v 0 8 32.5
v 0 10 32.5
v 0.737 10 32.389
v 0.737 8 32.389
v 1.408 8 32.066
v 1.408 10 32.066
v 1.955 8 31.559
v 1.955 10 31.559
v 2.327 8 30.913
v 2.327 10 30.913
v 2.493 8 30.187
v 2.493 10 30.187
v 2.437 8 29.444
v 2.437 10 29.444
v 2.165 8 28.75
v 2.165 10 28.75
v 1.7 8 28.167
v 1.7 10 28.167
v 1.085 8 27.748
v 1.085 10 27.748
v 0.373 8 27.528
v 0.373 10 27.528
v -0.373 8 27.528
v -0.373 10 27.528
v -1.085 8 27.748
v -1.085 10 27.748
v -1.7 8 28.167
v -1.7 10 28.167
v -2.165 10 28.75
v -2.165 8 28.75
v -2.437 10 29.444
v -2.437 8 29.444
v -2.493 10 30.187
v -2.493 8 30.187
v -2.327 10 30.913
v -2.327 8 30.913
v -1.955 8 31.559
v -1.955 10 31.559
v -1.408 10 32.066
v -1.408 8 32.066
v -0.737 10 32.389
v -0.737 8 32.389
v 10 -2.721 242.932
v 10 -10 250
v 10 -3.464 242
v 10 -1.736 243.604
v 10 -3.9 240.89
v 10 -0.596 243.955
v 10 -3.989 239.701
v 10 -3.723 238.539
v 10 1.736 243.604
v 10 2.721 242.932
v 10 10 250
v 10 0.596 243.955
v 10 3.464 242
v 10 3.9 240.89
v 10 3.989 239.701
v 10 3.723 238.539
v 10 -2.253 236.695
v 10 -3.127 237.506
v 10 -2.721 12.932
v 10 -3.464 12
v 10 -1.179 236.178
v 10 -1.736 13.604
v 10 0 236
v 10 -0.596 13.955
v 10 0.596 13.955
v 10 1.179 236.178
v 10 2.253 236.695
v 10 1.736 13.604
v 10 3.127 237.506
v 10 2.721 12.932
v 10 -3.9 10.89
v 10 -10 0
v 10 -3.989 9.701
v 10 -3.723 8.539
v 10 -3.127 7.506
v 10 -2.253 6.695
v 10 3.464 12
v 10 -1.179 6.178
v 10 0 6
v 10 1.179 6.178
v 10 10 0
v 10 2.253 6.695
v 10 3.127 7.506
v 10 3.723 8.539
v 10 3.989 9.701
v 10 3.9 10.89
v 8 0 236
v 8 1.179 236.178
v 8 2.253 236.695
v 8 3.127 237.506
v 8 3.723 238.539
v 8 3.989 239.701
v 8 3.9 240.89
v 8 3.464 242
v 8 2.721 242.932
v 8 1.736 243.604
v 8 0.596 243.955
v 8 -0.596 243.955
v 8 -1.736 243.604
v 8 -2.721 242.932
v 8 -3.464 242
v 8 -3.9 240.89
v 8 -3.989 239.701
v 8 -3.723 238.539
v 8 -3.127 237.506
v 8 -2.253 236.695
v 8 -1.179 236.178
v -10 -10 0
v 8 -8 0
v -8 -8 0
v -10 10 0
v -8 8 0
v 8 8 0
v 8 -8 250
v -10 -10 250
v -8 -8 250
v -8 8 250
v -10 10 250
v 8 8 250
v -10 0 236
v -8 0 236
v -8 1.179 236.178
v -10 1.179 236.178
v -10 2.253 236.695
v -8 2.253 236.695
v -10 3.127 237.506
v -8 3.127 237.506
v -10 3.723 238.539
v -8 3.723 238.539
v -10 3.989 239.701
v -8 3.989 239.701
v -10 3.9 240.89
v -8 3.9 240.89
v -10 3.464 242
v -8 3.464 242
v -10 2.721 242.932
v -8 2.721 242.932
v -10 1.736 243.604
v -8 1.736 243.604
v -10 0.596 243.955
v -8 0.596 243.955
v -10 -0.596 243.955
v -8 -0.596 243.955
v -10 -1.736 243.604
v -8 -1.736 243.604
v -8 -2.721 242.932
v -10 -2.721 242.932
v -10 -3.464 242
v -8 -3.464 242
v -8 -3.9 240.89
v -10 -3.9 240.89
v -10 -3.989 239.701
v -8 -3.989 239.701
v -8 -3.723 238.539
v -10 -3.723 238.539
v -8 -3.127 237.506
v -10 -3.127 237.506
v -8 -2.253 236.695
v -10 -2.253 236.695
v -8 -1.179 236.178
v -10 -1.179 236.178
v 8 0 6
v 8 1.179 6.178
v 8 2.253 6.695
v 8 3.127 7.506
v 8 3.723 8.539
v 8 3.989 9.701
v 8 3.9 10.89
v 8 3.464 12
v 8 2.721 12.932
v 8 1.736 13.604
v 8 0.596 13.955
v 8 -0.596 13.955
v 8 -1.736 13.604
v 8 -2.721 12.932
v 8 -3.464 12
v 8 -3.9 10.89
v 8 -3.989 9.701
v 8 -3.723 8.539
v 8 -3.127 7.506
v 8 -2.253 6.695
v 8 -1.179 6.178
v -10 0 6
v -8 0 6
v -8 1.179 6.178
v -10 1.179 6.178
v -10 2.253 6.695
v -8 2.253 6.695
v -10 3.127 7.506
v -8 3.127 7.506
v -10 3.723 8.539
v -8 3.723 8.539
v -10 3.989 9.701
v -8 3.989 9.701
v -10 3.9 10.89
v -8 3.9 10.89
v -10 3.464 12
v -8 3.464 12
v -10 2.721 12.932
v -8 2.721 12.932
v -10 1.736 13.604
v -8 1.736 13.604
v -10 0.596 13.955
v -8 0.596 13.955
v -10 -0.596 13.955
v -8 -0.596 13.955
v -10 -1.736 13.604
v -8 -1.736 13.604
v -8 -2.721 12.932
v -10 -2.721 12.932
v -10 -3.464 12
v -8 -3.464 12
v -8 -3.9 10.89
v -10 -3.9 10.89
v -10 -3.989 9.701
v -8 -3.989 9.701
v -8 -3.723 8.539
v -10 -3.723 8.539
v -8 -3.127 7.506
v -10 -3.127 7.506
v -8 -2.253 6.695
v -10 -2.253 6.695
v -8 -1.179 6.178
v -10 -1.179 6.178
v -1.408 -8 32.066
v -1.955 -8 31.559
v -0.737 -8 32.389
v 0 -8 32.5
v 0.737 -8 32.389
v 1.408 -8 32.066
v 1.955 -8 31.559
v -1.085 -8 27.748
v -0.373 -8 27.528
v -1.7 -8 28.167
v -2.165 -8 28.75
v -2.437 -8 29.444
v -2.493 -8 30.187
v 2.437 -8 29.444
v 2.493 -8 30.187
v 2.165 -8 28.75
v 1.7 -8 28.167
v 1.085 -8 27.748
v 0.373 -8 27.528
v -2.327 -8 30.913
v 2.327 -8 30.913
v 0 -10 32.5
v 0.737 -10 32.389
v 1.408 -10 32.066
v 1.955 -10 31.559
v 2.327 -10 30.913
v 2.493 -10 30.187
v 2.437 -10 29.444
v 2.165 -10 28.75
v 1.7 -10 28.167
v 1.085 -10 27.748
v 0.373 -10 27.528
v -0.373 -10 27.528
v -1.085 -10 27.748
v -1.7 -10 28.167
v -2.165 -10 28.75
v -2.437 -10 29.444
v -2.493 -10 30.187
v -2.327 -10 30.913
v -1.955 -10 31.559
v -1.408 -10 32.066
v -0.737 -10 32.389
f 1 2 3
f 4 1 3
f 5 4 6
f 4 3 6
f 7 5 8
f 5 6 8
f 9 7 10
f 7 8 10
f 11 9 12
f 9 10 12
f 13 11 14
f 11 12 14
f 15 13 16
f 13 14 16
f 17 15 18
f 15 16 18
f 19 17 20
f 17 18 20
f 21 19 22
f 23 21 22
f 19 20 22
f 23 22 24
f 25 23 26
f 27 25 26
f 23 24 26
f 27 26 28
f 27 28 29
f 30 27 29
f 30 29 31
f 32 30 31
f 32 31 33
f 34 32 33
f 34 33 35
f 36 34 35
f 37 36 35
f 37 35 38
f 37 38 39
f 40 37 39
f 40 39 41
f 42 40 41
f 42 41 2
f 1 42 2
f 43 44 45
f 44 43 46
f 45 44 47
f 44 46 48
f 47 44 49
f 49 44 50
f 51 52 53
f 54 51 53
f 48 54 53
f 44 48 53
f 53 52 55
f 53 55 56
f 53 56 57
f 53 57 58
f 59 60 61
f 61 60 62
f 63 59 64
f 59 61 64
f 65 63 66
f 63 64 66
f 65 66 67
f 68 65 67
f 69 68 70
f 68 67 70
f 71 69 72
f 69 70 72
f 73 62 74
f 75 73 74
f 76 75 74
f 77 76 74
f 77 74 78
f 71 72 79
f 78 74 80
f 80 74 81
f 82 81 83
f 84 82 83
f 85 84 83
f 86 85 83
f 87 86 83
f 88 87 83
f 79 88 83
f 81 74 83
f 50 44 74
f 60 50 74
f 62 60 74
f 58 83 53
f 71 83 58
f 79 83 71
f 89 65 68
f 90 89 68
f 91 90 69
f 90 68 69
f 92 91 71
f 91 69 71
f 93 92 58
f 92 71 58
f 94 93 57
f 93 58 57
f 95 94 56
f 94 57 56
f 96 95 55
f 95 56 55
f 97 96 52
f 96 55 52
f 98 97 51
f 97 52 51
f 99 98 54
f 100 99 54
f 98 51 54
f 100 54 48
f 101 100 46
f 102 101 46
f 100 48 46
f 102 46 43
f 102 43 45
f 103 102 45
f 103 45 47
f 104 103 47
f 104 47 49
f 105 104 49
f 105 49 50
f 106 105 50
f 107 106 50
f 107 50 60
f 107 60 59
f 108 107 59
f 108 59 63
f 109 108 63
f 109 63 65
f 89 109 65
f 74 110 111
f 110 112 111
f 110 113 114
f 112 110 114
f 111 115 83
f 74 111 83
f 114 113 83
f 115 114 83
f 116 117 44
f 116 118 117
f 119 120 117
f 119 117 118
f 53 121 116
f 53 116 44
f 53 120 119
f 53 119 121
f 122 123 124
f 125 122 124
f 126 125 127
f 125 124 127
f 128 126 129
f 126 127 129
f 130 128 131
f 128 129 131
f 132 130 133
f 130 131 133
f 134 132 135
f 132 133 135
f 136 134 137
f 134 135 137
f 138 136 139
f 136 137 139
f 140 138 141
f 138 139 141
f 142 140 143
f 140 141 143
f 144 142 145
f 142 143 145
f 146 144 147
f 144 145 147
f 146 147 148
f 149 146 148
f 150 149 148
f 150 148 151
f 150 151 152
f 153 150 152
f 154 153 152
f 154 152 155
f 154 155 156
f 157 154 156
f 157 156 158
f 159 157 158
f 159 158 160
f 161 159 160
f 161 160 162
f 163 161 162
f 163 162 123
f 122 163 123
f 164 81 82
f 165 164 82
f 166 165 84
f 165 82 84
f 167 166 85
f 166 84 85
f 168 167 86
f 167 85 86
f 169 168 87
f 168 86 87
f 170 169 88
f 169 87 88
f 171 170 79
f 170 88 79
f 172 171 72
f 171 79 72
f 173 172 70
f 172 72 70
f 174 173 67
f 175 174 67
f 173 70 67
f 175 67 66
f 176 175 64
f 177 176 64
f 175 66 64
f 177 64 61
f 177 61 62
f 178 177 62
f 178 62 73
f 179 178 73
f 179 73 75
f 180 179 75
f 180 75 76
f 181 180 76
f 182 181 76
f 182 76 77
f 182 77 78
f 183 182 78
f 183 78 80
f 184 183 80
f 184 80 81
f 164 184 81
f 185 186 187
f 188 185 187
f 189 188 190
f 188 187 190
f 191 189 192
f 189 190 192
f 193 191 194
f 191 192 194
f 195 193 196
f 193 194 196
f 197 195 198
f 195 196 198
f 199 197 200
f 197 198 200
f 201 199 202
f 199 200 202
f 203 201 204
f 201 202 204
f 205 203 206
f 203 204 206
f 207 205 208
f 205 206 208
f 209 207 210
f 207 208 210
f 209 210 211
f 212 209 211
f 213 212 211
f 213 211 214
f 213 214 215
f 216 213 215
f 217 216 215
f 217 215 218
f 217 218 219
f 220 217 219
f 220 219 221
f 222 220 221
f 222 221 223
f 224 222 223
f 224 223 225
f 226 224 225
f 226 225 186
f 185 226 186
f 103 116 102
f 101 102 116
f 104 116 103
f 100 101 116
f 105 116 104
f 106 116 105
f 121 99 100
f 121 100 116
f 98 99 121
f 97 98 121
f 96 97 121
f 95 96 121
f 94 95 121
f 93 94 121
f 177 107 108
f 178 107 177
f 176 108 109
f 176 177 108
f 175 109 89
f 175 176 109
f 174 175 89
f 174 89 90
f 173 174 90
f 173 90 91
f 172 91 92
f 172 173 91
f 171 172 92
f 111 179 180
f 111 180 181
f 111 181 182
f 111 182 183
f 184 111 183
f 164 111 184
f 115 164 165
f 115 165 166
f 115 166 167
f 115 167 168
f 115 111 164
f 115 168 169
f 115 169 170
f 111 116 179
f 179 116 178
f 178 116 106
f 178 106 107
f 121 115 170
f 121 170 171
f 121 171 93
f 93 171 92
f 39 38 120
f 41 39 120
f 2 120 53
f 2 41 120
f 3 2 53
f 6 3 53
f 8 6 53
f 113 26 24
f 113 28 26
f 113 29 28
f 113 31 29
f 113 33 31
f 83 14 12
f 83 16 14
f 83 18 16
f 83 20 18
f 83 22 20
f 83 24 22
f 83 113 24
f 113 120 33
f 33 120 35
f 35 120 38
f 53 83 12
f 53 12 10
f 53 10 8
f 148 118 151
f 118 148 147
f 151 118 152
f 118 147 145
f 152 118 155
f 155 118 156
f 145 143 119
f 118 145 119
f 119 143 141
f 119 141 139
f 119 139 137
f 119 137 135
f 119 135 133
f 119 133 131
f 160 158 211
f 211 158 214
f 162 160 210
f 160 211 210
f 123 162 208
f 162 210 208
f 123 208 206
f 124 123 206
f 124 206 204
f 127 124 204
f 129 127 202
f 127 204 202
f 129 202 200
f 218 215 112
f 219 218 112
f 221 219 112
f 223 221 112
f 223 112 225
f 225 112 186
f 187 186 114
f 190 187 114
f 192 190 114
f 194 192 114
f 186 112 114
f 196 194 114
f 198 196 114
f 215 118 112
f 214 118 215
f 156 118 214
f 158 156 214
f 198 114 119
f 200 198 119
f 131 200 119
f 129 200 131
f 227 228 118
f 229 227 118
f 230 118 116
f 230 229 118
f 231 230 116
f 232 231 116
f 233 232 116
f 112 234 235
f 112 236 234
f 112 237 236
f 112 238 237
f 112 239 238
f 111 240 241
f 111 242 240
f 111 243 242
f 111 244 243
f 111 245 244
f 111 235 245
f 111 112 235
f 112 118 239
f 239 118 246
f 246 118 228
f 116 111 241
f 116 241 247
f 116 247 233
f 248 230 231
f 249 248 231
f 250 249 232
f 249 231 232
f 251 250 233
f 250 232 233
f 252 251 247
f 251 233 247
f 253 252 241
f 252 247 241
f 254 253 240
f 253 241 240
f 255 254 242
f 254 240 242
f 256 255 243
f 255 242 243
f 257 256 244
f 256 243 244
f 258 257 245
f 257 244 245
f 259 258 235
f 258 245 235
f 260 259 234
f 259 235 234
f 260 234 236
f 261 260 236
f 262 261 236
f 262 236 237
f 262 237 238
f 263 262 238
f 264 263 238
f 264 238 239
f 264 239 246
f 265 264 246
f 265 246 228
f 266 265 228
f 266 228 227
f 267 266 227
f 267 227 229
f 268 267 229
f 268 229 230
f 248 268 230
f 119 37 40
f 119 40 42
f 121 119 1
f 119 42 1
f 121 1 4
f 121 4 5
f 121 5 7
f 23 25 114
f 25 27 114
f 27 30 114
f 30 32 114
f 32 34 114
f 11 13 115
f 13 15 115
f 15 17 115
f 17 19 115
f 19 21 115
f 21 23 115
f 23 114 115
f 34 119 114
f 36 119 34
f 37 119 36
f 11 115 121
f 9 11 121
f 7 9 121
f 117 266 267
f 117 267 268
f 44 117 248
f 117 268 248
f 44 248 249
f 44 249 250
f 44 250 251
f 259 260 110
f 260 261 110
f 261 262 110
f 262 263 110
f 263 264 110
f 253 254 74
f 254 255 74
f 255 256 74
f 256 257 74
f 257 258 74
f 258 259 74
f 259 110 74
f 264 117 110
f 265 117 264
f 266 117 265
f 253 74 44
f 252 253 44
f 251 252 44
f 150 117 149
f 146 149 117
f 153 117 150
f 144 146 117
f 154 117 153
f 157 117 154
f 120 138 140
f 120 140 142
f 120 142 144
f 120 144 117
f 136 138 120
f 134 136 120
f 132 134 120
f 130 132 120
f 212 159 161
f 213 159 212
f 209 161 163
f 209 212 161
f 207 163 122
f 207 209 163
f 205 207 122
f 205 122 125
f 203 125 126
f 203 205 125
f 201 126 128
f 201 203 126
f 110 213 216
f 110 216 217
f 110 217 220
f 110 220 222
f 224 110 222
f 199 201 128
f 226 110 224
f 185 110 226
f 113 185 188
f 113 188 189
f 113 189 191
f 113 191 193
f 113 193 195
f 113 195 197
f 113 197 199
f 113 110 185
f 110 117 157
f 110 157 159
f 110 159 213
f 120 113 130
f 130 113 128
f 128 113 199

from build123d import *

# Parameters (mm, degrees)
SZKIC1_W                    = 20
SZKIC1_H                    = 20
SZKIC1_W_2                  = 16
SZKIC1_H_2                  = 16
DODANIE_WYCI_GNI_CIE1_DEPTH = 250
SZKIC2_R                    = 4
WYTNIJ_WYCI_GNI_CIE1_DEPTH  = 251.99800796
SZKIC3_R                    = 2.5
WYTNIJ_WYCI_GNI_CIE2_DEPTH  = 251.99800796


with BuildPart() as part:
    # Szkic1 → Dodanie-wyciągnięcie1 (new body)
    with BuildSketch(Plane.XY):
        Rectangle(SZKIC1_W, SZKIC1_H)
        Rectangle(SZKIC1_W_2, SZKIC1_H_2, mode=Mode.SUBTRACT)
    extrude(amount=DODANIE_WYCI_GNI_CIE1_DEPTH)

    # Szkic2 → Wytnij-wyciągnięcie1 (cut, through all)
    with BuildSketch(Plane(origin=(10, 0, 0), x_dir=(0, 0, -1), z_dir=(1, 0, 0))):
        with Locations((-10, 0)):
            Circle(SZKIC2_R)
        with Locations((-240, 0)):
            Circle(SZKIC2_R)
    extrude(amount=-WYTNIJ_WYCI_GNI_CIE1_DEPTH, mode=Mode.SUBTRACT)

    # Szkic3 → Wytnij-wyciągnięcie2 (cut, through all)
    with BuildSketch(Plane(origin=(0, 10, 0), x_dir=(1, 0, 0), z_dir=(0, 1, 0))):
        with Locations(Location((0, -30, 0), (0, 0, 270))):
            Circle(SZKIC3_R)
    extrude(amount=-WYTNIJ_WYCI_GNI_CIE2_DEPTH, mode=Mode.SUBTRACT)


solid = part.part
